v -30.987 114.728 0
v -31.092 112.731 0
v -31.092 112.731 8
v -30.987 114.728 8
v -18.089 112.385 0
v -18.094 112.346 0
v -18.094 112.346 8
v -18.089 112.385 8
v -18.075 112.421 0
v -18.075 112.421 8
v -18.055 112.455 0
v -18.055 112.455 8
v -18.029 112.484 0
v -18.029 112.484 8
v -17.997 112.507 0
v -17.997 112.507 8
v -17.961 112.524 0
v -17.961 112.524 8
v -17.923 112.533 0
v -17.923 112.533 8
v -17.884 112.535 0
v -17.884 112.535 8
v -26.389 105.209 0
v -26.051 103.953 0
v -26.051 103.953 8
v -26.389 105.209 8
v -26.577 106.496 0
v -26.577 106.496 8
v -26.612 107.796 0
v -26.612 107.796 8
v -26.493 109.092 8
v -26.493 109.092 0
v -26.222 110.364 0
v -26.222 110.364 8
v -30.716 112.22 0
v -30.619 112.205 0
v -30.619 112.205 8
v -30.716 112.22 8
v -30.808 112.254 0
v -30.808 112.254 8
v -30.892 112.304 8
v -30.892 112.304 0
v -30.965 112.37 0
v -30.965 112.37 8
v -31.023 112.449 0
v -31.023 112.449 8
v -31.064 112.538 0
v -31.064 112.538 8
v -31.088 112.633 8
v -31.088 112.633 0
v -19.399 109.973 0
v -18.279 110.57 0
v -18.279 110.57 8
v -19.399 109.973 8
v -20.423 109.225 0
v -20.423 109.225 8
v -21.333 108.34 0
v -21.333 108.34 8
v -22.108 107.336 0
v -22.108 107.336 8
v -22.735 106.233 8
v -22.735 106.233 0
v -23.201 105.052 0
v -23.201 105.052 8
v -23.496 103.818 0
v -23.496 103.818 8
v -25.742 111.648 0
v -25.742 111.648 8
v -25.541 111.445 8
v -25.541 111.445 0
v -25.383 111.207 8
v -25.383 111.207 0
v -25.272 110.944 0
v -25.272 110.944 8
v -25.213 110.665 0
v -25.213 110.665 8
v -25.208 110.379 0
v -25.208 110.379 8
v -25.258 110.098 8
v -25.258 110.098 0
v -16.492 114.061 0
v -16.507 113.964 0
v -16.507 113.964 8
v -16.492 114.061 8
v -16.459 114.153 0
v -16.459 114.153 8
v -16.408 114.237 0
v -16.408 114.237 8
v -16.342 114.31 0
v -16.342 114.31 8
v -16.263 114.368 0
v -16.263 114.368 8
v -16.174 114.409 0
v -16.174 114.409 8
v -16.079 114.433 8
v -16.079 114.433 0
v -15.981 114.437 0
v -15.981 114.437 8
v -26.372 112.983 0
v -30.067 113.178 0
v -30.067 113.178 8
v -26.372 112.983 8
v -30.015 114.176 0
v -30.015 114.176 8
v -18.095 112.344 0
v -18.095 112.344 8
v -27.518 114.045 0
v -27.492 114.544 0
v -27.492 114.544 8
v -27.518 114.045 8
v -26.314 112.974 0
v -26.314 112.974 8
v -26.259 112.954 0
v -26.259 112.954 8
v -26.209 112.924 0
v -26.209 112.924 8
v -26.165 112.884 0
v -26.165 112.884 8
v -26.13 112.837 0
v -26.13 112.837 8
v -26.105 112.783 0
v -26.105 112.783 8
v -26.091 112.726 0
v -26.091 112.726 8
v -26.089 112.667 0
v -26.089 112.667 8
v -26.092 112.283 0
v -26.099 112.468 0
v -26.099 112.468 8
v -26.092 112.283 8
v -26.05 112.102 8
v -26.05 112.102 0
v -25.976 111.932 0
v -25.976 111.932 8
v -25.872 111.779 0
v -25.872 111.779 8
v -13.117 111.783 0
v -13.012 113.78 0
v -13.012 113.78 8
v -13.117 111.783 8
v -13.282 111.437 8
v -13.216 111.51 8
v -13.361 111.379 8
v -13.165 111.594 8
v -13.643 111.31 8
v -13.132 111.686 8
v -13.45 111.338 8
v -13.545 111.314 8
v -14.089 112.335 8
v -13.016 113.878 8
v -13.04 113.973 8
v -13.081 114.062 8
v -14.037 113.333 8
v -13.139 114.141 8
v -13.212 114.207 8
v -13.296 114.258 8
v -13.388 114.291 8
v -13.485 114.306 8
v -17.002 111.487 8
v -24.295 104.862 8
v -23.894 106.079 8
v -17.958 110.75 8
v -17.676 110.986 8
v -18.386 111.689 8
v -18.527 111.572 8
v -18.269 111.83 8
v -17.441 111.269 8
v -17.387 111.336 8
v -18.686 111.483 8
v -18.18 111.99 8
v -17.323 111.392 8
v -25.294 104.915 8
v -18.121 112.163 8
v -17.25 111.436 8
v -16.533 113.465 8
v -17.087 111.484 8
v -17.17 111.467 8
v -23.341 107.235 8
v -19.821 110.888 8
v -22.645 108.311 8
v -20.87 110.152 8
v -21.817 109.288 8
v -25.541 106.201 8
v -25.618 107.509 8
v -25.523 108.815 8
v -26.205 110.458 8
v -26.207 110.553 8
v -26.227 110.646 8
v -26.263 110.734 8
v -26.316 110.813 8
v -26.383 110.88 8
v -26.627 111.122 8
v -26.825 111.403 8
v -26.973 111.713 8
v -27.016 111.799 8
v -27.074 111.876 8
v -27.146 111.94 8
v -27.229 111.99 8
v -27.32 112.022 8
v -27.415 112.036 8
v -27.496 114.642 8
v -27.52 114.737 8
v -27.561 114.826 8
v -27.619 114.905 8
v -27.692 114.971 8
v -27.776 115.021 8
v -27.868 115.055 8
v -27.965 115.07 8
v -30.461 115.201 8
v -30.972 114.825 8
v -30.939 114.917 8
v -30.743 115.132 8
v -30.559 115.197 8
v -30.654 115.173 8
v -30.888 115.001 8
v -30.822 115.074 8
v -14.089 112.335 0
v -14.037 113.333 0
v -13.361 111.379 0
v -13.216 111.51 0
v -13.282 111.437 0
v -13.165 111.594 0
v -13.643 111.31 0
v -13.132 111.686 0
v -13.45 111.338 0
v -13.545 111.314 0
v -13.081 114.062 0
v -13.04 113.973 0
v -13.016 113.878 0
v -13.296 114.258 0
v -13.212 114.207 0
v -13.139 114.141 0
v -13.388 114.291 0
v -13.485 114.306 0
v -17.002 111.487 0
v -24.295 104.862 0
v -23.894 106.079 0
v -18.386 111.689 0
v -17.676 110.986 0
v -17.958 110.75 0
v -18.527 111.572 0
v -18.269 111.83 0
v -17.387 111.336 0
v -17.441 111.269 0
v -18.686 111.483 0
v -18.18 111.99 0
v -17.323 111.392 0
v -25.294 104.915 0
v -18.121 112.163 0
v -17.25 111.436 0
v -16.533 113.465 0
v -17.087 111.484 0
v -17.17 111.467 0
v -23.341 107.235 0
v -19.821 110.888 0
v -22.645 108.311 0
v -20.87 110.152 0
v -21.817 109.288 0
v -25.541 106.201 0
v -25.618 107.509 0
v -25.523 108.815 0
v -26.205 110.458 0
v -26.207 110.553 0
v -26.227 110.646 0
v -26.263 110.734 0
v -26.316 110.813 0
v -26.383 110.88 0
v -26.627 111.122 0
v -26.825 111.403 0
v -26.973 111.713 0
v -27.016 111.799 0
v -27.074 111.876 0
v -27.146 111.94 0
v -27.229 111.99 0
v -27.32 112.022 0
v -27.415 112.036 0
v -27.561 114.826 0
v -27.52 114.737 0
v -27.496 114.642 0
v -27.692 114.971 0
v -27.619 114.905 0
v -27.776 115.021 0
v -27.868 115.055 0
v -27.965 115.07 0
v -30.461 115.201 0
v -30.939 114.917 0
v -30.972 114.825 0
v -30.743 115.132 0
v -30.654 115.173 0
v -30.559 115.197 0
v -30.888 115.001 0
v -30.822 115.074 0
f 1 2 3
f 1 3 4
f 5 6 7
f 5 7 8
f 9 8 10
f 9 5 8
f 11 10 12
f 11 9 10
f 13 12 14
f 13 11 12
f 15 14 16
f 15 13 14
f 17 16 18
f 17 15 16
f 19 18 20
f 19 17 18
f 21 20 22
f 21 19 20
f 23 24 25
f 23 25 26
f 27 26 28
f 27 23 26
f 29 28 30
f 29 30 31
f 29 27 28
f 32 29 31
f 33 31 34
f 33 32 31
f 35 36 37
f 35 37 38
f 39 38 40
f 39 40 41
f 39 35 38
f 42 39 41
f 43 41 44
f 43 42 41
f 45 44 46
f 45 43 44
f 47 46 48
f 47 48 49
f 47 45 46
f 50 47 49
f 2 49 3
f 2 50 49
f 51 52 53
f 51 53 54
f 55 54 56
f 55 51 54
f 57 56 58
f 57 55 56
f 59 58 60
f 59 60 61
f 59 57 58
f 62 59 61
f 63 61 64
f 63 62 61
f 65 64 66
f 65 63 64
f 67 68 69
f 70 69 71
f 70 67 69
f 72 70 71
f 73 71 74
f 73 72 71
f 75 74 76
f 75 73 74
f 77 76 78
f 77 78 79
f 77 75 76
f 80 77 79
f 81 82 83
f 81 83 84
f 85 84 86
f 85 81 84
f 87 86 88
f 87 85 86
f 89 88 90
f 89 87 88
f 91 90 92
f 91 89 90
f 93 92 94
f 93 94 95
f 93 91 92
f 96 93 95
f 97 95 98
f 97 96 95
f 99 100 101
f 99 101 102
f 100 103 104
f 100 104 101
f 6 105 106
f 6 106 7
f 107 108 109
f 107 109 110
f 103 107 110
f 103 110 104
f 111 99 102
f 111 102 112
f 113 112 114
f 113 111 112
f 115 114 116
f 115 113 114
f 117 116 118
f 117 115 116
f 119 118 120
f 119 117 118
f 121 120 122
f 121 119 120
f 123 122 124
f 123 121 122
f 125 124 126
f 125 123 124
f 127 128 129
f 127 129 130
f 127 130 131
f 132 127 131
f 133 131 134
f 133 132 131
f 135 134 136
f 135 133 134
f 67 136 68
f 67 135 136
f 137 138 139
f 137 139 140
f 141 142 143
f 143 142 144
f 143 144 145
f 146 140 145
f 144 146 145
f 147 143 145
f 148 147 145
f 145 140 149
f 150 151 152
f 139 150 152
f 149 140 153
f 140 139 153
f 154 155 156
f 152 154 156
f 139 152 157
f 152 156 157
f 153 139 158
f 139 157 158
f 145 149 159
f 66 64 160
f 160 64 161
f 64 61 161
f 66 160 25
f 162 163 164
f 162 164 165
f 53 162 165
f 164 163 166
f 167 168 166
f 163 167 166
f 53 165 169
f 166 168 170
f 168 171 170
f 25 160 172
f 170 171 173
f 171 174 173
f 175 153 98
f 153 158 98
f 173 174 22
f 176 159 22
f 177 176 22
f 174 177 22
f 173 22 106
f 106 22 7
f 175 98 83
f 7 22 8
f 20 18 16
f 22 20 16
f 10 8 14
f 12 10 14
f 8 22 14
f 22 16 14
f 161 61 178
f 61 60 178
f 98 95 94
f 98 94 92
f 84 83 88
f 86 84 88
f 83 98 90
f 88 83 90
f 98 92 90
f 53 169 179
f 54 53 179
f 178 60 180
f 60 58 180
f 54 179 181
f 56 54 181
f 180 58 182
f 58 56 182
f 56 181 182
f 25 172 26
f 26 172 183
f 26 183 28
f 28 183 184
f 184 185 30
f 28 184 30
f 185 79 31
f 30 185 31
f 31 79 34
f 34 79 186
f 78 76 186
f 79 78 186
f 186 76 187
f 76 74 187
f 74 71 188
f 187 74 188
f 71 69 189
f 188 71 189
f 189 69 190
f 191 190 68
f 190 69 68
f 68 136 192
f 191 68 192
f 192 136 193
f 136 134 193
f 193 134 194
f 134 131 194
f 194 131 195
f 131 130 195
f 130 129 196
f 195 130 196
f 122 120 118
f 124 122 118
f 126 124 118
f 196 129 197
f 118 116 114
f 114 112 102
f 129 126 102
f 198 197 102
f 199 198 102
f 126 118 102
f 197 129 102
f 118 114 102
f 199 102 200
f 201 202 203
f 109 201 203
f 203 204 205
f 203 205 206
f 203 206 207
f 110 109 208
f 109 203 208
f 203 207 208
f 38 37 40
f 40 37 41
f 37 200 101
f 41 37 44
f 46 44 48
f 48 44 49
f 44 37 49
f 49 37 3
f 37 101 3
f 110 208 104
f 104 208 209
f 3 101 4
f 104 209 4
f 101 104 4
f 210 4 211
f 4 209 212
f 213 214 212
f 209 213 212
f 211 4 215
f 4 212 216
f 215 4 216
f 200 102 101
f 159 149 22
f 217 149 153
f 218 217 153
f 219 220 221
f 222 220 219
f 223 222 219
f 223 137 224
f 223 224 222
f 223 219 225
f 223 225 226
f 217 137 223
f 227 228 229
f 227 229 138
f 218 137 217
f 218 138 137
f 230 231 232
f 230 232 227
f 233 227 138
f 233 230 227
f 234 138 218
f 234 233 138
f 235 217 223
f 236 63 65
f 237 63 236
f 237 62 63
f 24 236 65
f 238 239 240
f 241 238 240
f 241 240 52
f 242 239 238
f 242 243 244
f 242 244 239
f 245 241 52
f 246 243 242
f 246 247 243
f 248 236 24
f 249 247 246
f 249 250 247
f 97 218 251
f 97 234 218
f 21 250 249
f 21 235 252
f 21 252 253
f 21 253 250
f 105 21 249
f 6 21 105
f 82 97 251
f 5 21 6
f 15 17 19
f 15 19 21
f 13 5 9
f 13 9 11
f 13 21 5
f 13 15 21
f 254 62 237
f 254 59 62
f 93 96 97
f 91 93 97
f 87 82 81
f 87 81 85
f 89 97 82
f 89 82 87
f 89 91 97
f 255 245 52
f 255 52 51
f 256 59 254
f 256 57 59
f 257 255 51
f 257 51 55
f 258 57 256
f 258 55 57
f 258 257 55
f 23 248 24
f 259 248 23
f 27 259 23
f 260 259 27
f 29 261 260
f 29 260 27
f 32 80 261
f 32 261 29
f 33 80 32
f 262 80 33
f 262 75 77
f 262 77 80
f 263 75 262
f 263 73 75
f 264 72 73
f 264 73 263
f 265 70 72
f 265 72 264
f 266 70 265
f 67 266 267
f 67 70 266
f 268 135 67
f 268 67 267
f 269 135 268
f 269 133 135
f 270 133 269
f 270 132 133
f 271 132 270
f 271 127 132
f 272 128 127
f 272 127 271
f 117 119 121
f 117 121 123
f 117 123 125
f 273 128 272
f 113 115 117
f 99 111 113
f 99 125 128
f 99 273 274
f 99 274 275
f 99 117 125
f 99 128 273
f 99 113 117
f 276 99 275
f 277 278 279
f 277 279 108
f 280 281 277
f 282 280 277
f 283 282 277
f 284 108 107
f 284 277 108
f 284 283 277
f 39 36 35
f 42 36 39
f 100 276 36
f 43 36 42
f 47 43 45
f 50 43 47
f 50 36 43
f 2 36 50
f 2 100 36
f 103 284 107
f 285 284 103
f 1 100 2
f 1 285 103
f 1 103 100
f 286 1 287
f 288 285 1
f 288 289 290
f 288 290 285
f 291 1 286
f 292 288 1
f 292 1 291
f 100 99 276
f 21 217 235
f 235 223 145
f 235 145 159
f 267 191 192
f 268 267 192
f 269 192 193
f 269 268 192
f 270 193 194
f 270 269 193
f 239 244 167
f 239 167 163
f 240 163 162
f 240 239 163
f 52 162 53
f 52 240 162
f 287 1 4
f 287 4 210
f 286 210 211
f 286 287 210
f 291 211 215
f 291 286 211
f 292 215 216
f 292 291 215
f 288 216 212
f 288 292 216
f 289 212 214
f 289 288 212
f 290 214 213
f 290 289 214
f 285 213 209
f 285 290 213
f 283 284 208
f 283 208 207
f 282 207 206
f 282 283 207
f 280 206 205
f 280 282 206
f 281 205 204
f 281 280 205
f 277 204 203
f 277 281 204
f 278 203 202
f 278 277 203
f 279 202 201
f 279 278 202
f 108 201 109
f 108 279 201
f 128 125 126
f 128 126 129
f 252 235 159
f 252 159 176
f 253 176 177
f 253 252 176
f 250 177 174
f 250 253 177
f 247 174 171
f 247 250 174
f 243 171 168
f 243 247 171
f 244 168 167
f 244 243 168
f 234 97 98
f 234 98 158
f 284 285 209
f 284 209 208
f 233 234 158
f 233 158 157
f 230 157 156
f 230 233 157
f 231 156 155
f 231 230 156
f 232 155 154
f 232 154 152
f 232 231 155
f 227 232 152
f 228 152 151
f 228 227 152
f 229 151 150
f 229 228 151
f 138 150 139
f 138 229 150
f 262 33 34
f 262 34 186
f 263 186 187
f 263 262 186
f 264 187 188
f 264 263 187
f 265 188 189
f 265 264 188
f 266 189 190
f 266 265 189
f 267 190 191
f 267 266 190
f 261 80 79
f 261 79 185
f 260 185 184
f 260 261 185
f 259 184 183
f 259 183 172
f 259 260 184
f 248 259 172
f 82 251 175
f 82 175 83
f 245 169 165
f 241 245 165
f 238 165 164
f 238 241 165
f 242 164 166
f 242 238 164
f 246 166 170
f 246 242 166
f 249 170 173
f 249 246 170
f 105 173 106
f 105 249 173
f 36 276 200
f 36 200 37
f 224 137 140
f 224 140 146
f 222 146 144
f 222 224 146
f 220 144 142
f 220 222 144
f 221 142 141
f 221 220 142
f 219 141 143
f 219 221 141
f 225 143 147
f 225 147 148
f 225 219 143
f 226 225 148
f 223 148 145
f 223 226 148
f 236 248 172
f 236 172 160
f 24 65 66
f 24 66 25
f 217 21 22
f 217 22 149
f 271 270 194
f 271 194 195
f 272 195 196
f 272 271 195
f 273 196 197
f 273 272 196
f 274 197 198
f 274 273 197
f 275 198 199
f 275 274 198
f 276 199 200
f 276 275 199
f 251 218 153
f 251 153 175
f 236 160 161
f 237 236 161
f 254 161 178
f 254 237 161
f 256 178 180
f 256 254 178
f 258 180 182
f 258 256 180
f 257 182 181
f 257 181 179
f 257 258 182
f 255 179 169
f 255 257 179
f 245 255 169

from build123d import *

# Parameters (mm, degrees)
EXTRUSION1_DEPTH = 8


with BuildPart() as part:
    # Esquisse1 → Extrusion1 (new body)
    with BuildSketch(Plane.XY):
        with BuildLine():
            Line((-30.067257497, 113.177740746), (-26.372396833, 112.98279286))
            ThreePointArc((-26.372396833, 112.98279286), (-26.165189094, 112.883870001), (-26.088620122, 112.667402978))
            Line((-26.088620122, 112.667402978), (-26.099157845, 112.46768078))
            ThreePointArc((-26.099157845, 112.46768078), (-26.017294744, 112.015525883), (-25.741864343, 111.647716541))
            ThreePointArc((-25.741864343, 111.647716541), (-25.272050301, 110.943990552), (-25.257835426, 110.097968424))
            ThreePointArc((-25.257835426, 110.097968424), (-25.617558346, 107.508747112), (-25.293951096, 104.914764474))
            Line((-25.293951096, 104.914764474), (-24.295340106, 104.862075856))
            ThreePointArc((-24.295340106, 104.862075856), (-22.246338792, 108.812632079), (-18.686198774, 111.482969868))
            ThreePointArc((-18.686198774, 111.482969868), (-18.269079288, 111.829964974), (-18.094570878, 112.343716941))
            Line((-18.094570878, 112.343716941), (-18.094463339, 112.345755135))
            ThreePointArc((-18.094463339, 112.345755135), (-18.028514766, 112.483893628), (-17.884203417, 112.534939609))
            Line((-17.884203417, 112.534939609), (-14.089481655, 112.334722862))
            Line((-14.089481655, 112.334722862), (-14.036793037, 113.333333852))
            Line((-14.036793037, 113.333333852), (-16.533320513, 113.465055396))
            Line((-16.533320513, 113.465055396), (-16.506976204, 113.964360891))
            ThreePointArc((-16.506976204, 113.964360891), (-16.342104771, 114.309707124), (-15.9813264, 114.437322078))
            Line((-15.9813264, 114.437322078), (-13.484798924, 114.305600533))
            ThreePointArc((-13.484798924, 114.305600533), (-13.139452692, 114.1407291), (-13.011837738, 113.779950729))
            Line((-13.011837738, 113.779950729), (-13.117214974, 111.782728749))
            ThreePointArc((-13.117214974, 111.782728749), (-13.282086407, 111.437382517), (-13.642864778, 111.309767563))
            Line((-13.642864778, 111.309767563), (-17.001536207, 111.486977464))
            ThreePointArc((-17.001536207, 111.486977464), (-17.249736921, 111.435756488), (-17.440940787, 111.269418687))
            ThreePointArc((-17.440940787, 111.269418687), (-17.811384631, 110.86115449), (-18.27921568, 110.569534177))
            ThreePointArc((-18.27921568, 110.569534177), (-21.738141003, 107.85137108), (-23.495527443, 103.818485275))
            Line((-23.495527443, 103.818485275), (-26.050896674, 103.953311422))
            ThreePointArc((-26.050896674, 103.953311422), (-26.613892326, 107.145851257), (-26.221838859, 110.363858214))
            ThreePointArc((-26.221838859, 110.363858214), (-26.226577151, 110.64586559), (-26.383181832, 110.880440919))
            ThreePointArc((-26.383181832, 110.880440919), (-26.732137821, 111.258311168), (-26.97318193, 111.712683202))
            ThreePointArc((-26.97318193, 111.712683202), (-27.145818586, 111.940425538), (-27.41499639, 112.036411457))
            Line((-27.41499639, 112.036411457), (-30.61925161, 112.205474065))
            ThreePointArc((-30.61925161, 112.205474065), (-30.964597842, 112.370345498), (-31.092212796, 112.731123869))
            Line((-31.092212796, 112.731123869), (-30.98683556, 114.728345849))
            ThreePointArc((-30.98683556, 114.728345849), (-30.821964127, 115.073692081), (-30.461185756, 115.201307035))
            Line((-30.461185756, 115.201307035), (-27.964658281, 115.069585491))
            ThreePointArc((-27.964658281, 115.069585491), (-27.619312049, 114.904714058), (-27.491697095, 114.543935687))
            Line((-27.491697095, 114.543935687), (-27.518041404, 114.044630192))
            Line((-27.518041404, 114.044630192), (-30.014568879, 114.176351736))
            Line((-30.014568879, 114.176351736), (-30.067257497, 113.177740746))
        make_face()
    extrude(amount=EXTRUSION1_DEPTH)


solid = part.part
